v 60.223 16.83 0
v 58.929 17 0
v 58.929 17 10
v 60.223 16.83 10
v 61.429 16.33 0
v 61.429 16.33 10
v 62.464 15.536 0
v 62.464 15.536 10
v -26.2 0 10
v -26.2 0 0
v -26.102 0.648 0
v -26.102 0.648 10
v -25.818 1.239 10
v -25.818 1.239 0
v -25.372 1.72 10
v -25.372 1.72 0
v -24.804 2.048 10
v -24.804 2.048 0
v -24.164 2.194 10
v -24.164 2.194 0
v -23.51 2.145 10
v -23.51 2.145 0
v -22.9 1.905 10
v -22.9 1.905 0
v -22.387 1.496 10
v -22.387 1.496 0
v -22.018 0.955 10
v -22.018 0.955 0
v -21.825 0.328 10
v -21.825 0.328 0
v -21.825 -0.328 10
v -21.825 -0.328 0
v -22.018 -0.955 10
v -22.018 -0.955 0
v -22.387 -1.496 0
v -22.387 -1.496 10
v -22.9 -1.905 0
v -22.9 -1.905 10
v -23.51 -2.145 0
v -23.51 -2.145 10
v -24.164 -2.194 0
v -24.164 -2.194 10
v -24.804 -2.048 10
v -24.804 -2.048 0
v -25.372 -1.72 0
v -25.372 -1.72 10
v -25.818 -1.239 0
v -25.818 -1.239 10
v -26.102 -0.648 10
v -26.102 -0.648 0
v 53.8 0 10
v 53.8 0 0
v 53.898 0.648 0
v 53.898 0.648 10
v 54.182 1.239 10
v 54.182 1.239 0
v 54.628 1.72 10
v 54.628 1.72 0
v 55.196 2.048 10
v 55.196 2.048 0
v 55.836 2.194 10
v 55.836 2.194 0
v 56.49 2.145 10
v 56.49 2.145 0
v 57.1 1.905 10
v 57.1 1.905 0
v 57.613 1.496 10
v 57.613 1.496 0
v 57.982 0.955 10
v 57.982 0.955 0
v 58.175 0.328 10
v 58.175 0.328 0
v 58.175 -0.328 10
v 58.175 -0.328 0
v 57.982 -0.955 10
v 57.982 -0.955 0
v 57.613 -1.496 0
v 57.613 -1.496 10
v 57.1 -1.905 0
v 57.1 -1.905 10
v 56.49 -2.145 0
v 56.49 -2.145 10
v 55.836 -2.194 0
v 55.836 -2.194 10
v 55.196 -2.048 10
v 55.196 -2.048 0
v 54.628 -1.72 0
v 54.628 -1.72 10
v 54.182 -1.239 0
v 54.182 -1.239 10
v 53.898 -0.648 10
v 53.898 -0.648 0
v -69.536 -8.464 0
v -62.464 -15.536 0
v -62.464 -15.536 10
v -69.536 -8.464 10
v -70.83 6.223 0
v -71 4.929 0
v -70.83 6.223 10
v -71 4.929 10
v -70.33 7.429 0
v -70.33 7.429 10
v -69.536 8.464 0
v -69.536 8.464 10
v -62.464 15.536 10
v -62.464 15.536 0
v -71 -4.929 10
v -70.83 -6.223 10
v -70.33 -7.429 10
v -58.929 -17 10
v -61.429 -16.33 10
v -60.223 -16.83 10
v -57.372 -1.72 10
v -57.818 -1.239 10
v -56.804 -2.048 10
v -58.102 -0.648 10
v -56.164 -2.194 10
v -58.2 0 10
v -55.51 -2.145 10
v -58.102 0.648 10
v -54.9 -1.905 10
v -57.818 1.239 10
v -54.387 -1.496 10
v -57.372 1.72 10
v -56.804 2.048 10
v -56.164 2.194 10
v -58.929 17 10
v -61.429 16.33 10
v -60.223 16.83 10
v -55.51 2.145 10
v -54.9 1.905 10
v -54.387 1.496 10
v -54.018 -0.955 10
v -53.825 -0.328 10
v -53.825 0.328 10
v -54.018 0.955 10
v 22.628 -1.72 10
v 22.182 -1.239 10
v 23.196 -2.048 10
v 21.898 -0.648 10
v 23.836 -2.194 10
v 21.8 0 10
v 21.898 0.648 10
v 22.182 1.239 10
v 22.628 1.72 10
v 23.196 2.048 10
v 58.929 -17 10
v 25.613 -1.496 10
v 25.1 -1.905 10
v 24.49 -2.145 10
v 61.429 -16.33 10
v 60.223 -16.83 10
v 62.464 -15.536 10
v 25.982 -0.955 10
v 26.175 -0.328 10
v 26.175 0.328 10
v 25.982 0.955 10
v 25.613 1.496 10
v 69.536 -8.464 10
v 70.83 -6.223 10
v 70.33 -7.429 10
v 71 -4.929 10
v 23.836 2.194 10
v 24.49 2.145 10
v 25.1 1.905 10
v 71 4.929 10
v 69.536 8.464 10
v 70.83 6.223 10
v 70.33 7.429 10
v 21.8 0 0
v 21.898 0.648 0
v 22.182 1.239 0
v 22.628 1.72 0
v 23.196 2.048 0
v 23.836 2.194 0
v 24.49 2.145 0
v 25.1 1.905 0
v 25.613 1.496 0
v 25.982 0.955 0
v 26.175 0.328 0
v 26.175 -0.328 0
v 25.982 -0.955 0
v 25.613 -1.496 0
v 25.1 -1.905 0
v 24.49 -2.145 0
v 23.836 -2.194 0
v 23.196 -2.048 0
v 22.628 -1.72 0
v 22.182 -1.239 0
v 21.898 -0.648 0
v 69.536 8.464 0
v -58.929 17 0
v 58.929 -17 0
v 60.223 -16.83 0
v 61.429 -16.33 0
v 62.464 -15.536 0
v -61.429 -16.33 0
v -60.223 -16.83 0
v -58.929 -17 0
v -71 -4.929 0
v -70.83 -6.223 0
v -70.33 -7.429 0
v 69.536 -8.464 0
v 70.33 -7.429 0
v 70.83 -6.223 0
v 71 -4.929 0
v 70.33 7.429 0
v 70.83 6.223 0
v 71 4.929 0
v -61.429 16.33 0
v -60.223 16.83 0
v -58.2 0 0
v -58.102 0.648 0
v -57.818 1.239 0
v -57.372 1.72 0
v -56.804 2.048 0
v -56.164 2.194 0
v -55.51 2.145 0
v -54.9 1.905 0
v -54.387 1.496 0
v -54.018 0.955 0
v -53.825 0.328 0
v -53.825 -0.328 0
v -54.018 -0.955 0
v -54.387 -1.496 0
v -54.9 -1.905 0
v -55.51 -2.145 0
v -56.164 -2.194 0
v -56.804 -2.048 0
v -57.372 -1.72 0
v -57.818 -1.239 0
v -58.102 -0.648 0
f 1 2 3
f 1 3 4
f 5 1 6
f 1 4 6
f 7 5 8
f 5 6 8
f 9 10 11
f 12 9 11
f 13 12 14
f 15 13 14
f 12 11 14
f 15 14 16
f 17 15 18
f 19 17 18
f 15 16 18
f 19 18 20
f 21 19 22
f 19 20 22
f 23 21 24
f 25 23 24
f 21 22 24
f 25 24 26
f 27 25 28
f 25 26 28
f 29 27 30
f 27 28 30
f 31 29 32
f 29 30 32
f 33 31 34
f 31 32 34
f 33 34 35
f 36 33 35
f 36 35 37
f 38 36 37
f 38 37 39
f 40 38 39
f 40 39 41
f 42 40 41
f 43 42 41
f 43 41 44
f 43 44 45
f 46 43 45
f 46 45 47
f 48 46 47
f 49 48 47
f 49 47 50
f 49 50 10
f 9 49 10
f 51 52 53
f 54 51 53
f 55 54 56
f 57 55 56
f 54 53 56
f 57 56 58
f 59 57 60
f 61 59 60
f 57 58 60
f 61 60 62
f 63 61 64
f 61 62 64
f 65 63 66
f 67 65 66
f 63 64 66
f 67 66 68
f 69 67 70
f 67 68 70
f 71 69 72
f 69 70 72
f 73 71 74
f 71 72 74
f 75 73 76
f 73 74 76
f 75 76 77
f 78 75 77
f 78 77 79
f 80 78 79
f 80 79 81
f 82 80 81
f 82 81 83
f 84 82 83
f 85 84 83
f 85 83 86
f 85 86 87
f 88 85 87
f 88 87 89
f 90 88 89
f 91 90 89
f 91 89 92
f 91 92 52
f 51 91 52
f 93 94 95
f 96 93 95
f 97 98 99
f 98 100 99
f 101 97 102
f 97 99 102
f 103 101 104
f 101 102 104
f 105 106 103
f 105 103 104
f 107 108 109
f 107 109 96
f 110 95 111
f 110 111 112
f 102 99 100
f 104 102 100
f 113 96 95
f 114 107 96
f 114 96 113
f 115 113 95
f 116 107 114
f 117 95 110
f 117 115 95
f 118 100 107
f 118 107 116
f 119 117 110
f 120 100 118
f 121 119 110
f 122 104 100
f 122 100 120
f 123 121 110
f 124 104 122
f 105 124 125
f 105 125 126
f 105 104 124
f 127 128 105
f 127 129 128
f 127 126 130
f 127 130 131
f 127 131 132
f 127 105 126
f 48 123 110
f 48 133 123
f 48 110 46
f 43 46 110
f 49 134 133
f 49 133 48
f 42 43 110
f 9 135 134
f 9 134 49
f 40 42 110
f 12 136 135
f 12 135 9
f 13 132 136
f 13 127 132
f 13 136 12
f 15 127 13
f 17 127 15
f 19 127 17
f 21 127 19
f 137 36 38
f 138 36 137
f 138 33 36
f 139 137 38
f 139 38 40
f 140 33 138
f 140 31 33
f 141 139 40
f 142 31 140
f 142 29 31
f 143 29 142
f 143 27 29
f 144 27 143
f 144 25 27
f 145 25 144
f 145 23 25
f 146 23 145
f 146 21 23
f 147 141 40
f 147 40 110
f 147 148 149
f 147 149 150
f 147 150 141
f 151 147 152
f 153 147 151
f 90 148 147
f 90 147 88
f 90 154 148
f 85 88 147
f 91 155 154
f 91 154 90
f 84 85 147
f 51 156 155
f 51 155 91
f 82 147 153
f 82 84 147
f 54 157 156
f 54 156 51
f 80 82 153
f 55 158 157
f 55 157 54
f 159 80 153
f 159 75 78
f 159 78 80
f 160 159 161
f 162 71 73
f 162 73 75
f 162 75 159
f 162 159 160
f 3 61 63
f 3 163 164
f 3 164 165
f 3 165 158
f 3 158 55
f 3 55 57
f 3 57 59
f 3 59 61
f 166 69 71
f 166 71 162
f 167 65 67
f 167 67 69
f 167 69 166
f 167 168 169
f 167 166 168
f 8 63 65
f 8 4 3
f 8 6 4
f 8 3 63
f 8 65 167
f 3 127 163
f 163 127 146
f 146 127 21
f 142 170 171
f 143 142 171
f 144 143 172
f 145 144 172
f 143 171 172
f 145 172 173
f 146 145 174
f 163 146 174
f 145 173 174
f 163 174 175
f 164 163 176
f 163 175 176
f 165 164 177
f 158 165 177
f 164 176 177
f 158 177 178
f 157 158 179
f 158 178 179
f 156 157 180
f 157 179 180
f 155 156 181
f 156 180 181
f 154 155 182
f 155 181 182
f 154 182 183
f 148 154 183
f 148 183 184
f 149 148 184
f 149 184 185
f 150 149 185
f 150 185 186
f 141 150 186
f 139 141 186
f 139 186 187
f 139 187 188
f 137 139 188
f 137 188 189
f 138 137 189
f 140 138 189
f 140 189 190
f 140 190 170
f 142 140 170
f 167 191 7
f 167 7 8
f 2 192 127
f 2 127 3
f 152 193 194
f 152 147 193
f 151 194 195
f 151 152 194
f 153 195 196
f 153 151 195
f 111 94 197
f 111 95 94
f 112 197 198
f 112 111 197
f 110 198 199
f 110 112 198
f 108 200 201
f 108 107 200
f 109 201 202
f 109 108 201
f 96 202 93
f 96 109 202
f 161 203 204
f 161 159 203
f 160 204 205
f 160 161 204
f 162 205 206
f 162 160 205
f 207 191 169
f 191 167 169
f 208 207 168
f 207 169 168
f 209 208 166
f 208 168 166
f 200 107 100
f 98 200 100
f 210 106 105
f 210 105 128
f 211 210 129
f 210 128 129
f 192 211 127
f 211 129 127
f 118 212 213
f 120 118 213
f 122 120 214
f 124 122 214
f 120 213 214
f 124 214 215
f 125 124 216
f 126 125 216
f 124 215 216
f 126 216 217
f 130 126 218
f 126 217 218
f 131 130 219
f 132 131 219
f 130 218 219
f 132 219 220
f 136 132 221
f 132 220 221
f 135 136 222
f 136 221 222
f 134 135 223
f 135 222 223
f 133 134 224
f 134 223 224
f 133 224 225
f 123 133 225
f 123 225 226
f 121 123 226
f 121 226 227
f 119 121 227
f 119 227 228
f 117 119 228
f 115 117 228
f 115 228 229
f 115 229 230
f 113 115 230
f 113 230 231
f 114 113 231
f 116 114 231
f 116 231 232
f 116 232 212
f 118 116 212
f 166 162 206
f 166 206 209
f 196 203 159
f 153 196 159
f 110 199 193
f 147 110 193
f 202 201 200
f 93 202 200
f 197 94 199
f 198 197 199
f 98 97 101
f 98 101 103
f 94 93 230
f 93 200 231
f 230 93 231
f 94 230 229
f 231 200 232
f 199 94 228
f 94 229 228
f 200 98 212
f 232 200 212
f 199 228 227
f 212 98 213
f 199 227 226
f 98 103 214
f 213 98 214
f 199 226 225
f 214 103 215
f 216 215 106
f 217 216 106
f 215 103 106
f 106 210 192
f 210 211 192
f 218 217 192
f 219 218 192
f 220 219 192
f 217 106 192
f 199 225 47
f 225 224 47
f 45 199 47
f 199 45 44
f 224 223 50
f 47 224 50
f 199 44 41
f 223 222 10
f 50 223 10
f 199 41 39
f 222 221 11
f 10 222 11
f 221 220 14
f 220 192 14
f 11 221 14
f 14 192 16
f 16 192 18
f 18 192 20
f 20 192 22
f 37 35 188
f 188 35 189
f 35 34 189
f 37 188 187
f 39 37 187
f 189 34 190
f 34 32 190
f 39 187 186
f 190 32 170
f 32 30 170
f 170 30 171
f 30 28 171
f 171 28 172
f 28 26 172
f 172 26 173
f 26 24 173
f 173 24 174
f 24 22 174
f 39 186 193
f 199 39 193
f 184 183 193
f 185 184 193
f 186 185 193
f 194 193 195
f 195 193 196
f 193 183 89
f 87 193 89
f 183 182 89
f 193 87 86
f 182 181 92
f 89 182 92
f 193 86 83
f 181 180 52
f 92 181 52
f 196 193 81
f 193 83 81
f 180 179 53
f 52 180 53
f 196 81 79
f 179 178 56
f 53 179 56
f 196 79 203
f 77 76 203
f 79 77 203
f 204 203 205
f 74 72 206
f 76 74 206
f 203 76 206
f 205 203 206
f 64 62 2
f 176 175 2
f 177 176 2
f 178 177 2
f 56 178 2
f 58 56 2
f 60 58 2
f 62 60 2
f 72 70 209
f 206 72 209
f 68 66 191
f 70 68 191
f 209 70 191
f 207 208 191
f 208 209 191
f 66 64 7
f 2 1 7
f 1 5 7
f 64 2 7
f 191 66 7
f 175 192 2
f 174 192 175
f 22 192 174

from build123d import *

# Parameters (mm, degrees)
F0_W     = 142
F0_H     = 34
F1_DEPTH = 10
F3_D     = 4.4
F4_SIZE  = 10
F5_R     = 5


with BuildPart() as f1:
    # F0 (on Top) → F1 (new body)
    with BuildSketch(Plane.XY):
        Rectangle(F0_W, F0_H)
    extrude(amount=F1_DEPTH)

    # F3 (through all)
    with Locations(Plane.XY.offset(10)):
        with Locations((-56, 0), (-24, 0), (24, 0), (56, 0)):
            Hole(F3_D / 2)

    # F4
    f4_edges = [f1.edges().sort_by_distance(p)[0] for p in [
        (-71, -17, 5),
        (71, -17, 5),
        (71, 17, 5),
        (-71, 17, 5),
    ]]
    chamfer(f4_edges, length=F4_SIZE)

    # F5
    f5_edges = [f1.edges().sort_by_distance(p)[0] for p in [
        (-61, -17, 5),
        (-71, -7, 5),
        (61, -17, 5),
        (71, -7, 5),
        (71, 7, 5),
        (61, 17, 5),
        (-61, 17, 5),
        (-71, 7, 5),
    ]]
    fillet(f5_edges, radius=F5_R)


solid = f1.part
